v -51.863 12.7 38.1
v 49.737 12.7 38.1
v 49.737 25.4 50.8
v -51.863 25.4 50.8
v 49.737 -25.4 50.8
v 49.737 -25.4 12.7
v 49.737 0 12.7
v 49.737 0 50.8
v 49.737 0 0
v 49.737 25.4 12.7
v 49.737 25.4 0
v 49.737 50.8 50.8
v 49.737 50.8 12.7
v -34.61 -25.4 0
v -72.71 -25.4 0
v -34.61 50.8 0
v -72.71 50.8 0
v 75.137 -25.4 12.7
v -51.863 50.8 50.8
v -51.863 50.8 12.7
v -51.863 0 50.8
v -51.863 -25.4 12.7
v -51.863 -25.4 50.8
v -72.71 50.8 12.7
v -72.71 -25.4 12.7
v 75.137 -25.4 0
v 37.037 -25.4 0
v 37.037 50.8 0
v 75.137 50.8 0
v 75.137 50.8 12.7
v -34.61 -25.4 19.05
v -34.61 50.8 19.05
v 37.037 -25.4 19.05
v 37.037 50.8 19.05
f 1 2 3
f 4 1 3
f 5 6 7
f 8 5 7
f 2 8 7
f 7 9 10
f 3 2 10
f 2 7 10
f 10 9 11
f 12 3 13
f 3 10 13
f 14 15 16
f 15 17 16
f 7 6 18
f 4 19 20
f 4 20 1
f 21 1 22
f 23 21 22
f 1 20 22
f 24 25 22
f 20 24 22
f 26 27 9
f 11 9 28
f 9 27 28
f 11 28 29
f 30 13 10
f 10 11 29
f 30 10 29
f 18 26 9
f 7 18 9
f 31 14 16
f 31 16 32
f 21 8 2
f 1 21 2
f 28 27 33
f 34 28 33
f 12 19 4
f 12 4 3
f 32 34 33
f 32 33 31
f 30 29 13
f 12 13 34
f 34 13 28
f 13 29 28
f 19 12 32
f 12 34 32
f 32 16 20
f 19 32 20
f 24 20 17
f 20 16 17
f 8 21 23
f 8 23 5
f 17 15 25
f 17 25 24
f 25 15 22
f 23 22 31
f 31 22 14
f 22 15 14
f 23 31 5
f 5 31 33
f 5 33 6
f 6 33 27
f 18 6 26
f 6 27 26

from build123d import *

# Parameters (mm, degrees)
F0_W     = 20.847595
F0_H     = 76.2
F1_DEPTH = 12.7
F2_DEPTH = 50.8
F3_DEPTH = 12.7
F4_DEPTH = 12.7
F6_DEPTH = 122.448595
F7_W     = 71.647595
F7_H     = 19.05
F8_DEPTH = 101.6


with BuildPart() as f1:
    # F0 (on Top) → F1 (new body)
    with BuildSketch(Plane.XY):
        with Locations((-62.286463, 12.7)):
            Rectangle(F0_W, F0_H)
    extrude(amount=F1_DEPTH)

    # F0 (on Top) → F2 (join)
    with BuildSketch(Plane.XY):
        Polygon((49.737334, 50.8), (-51.862666, 50.8), (-51.862666, -25.4), (49.737334, -25.4), (49.737334, 0), (49.737334, 25.4), align=None)
    extrude(amount=F2_DEPTH)

    # F0 (on Top) → F3 (join)
    with BuildSketch(Plane.XY):
        Polygon((75.137334, 50.8), (49.737334, 50.8), (49.737334, 25.4), align=None)
    extrude(amount=F3_DEPTH)

    # F0 (on Top) → F4 (join)
    with BuildSketch(Plane.XY):
        Polygon((49.737334, 0), (49.737334, -25.4), (75.137334, -25.4), align=None)
    extrude(amount=F4_DEPTH)

    # F5 (on face) → F6 (cut, through all)
    with BuildSketch(Plane.YZ.offset(49.737334)):
        Polygon((25.4, 50.8), (0, 50.8), (12.7, 38.1), align=None)
    extrude(amount=-F6_DEPTH, mode=Mode.SUBTRACT)

    # F7 (on face) → F8 (cut)
    with BuildSketch(Plane(origin=(0, 50.8, 0), x_dir=(-1, 0, 0), z_dir=(0, 1, 0))):
        with Locations((-1.213537, 9.525)):
            Rectangle(F7_W, F7_H)
    extrude(amount=-F8_DEPTH, mode=Mode.SUBTRACT)


solid = f1.part
